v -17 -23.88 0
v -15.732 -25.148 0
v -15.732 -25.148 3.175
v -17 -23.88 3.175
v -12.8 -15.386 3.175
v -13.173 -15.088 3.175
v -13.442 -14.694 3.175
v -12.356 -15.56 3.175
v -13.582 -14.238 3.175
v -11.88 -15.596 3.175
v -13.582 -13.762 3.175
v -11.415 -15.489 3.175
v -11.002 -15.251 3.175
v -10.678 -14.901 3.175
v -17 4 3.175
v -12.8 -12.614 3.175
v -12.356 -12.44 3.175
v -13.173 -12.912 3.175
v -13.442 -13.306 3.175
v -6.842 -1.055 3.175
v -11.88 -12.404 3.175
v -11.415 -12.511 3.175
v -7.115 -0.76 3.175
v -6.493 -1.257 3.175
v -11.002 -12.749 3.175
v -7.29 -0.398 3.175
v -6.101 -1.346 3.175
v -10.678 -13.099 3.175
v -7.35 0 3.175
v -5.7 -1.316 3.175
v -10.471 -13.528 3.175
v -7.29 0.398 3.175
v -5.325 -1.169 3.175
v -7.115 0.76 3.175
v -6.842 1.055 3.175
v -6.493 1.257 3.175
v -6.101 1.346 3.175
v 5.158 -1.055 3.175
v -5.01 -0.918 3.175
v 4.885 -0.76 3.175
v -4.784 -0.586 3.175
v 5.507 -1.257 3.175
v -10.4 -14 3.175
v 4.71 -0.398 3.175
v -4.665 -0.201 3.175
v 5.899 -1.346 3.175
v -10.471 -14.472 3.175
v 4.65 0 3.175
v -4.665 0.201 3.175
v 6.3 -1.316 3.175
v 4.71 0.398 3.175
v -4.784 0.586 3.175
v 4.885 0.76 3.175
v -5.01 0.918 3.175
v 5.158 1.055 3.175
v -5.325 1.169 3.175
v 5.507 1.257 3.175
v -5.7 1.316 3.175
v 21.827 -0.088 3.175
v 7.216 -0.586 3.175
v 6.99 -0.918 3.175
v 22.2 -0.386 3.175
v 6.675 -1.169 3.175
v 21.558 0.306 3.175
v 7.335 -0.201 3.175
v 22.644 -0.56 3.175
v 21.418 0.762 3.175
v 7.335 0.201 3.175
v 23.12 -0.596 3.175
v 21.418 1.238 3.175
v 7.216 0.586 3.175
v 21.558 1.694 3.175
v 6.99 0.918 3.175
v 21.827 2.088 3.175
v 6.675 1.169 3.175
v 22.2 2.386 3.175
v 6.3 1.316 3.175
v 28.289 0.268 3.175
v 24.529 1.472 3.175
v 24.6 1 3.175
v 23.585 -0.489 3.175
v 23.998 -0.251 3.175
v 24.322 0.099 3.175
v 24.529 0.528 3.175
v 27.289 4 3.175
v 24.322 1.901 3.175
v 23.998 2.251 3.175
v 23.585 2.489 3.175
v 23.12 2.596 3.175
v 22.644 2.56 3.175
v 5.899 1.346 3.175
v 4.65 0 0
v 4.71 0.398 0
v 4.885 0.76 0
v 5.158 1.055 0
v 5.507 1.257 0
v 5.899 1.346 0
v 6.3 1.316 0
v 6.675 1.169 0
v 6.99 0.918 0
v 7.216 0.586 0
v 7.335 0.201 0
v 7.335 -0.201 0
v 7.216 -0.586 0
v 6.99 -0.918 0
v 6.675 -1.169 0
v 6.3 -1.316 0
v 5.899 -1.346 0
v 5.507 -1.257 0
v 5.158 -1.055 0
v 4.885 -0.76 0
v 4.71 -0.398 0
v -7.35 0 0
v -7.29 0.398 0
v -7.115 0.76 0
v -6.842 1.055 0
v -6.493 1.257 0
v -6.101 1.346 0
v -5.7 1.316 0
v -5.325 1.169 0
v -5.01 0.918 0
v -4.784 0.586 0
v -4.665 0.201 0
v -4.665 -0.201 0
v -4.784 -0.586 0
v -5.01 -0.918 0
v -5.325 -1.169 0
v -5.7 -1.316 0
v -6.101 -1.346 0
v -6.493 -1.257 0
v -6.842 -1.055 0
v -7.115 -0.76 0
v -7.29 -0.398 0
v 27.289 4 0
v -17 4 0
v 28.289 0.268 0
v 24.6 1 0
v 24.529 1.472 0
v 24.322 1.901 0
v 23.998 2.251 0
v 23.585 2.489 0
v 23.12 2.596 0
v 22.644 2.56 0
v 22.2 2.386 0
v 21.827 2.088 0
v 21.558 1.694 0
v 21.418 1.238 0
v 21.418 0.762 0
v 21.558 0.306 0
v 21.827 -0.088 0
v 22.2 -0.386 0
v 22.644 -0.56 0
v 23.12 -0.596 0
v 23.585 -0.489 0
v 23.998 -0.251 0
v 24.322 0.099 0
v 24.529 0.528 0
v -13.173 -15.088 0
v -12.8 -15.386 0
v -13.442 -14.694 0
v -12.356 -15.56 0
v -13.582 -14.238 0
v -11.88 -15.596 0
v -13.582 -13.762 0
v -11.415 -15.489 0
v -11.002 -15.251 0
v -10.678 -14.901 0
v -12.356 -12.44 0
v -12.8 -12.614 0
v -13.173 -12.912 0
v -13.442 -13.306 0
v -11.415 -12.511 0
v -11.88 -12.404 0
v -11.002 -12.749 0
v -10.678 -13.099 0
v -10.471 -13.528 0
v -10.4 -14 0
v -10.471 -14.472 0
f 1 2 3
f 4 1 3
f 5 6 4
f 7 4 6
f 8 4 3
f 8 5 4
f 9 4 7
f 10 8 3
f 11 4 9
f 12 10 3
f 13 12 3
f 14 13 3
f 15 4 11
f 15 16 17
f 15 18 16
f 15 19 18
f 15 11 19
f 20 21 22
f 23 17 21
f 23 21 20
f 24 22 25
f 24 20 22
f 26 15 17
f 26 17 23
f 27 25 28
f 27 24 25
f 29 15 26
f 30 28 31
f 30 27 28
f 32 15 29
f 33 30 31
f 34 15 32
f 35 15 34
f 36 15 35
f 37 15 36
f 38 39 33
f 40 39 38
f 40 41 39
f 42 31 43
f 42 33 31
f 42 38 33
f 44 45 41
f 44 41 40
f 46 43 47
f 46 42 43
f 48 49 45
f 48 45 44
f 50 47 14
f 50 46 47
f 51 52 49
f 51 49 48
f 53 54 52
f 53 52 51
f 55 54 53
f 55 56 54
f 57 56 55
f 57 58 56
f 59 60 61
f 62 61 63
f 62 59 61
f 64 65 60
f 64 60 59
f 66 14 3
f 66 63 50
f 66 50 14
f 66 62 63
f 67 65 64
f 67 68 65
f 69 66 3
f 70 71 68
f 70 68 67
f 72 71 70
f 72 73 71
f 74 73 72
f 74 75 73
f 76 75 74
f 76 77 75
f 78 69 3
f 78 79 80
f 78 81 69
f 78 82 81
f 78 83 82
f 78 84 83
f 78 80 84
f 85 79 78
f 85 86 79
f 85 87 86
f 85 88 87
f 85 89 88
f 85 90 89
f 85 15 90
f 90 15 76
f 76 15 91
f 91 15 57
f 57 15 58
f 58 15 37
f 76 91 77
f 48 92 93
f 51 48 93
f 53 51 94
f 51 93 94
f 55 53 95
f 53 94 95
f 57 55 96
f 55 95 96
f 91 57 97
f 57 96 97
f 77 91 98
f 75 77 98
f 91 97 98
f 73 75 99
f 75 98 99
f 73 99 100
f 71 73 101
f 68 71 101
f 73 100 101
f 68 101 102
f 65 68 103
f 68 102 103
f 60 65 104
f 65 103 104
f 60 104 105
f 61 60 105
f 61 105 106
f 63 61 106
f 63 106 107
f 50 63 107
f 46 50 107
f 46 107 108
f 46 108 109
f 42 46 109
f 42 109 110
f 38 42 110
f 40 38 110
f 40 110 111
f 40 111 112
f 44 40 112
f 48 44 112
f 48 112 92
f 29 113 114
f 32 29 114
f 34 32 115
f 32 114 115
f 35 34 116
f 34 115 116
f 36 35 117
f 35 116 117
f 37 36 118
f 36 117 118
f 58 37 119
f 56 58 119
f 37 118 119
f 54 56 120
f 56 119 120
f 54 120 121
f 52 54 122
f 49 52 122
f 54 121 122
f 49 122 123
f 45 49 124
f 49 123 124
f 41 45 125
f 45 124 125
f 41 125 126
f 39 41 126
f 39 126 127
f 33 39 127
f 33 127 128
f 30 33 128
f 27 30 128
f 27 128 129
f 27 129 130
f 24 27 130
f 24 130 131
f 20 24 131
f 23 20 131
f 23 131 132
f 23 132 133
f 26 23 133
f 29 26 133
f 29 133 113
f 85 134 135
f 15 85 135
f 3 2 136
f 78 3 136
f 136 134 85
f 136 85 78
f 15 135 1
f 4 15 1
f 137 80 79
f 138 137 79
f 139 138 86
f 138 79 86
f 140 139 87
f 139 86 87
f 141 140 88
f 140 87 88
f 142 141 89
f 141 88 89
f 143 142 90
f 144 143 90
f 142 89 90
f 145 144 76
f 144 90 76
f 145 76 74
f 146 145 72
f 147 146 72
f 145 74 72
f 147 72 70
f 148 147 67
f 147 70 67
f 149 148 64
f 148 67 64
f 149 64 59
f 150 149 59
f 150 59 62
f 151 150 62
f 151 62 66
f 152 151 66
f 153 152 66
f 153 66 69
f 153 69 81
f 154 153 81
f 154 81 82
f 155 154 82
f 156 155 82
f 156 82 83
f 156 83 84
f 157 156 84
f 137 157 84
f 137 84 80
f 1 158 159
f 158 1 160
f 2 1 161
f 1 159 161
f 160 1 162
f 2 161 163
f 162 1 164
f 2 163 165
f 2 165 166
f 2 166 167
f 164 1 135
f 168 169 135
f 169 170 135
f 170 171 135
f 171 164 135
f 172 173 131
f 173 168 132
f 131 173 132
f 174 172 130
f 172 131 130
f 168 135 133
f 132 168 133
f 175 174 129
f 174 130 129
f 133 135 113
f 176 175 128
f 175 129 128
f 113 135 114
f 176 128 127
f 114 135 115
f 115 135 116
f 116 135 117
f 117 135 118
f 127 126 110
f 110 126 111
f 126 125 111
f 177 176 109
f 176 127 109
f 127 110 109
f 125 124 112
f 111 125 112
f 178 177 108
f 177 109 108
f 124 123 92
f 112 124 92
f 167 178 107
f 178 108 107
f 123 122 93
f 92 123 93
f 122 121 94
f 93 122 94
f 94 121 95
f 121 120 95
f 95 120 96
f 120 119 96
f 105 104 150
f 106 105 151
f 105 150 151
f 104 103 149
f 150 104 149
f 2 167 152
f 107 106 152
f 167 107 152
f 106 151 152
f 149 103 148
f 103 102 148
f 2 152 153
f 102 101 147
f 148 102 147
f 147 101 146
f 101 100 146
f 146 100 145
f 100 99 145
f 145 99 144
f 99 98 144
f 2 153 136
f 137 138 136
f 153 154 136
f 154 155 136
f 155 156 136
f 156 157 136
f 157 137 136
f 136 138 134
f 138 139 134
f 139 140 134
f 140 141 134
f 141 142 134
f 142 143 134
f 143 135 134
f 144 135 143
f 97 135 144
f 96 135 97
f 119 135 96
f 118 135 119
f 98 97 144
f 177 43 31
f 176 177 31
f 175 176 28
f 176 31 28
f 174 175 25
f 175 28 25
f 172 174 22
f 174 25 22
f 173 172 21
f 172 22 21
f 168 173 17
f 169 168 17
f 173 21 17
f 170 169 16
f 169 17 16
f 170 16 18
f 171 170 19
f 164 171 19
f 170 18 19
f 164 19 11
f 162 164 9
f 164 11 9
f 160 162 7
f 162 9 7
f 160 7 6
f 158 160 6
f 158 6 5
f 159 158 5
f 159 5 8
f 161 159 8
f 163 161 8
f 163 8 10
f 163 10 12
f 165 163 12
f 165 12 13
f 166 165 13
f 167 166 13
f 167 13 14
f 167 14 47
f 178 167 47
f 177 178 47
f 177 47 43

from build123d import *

# Parameters (mm, degrees)
BOSS_EXTRUDE1_DEPTH    = 3.175
M2_5_CLEARANCE_HOLE1_D = 2.7
CHAMFER1_SIZE          = 2
CHAMFER1_SIZE2         = 1.464101615
M3_CLEARANCE_HOLE1_D   = 3.2


with BuildPart() as part:
    # Sketch2 → Boss-Extrude1 (new body)
    with BuildSketch(Plane.XY):
        Polygon((17, 4), (-17, 4), (-17, -25.879909152), (34.753520778, 4), align=None)
    extrude(amount=BOSS_EXTRUDE1_DEPTH)

    # M2.5 Clearance Hole1 (through all)
    with Locations(Plane.XY.offset(3.175)):
        with Locations((-6, 0), (6, 0)):
            Hole(M2_5_CLEARANCE_HOLE1_D / 2)

    # Fillet1
    # the kernel refuses this chamfer: 2 mm, written as the material it takes off along each edge
    with BuildSketch(Plane(origin=(34.753520778, 4, -18.713015054), x_dir=(-0.9999467105068274, 0.01032357237467217, 0), z_dir=(0, 0, 1))) as fillet1_piece_1:
        with BuildLine():
            Line((7.485206022, 0), (6.403726885, 3.875640743))
            Line((6.403726885, 3.875640743), (6.383370332, 3.910073441))
            ThreePointArc((6.383370332, 3.910073441), (3.20116981, 1.938993637), (-0.020356553, 0.034432699))
            Line((-0.020356553, 0.034432699), (0.000412943, -0.039997868))
            ThreePointArc((0.000412943, -0.039997868), (3.742617081, -0.001362894), (7.485618964, -0.039997868))
            Line((7.485618964, -0.039997868), (7.485206022, 0))
        make_face()
    extrude(amount=40.601030108, mode=Mode.SUBTRACT)

    # Chamfer1
    chamfer1_edges = [part.edges().sort_by_distance(p)[0] for p in [
        (-17, -25.879909152, 1.5875),
    ]]
    chamfer1_side = [part.faces().sort_by_distance(p)[0] for p in [
        (-17, -10.939954576, 1.5875),
    ]]
    chamfer(chamfer1_edges, length=CHAMFER1_SIZE, length2=CHAMFER1_SIZE2, reference=chamfer1_side[0])

    # M3 Clearance Hole1 (through all)
    with Locations(Plane(origin=(0, 0, 0), x_dir=(-1, 0, 0), z_dir=(0, 0, -1))):
        with Locations((-23, 1), (12, -14)):
            Hole(M3_CLEARANCE_HOLE1_D / 2)


solid = part.part
